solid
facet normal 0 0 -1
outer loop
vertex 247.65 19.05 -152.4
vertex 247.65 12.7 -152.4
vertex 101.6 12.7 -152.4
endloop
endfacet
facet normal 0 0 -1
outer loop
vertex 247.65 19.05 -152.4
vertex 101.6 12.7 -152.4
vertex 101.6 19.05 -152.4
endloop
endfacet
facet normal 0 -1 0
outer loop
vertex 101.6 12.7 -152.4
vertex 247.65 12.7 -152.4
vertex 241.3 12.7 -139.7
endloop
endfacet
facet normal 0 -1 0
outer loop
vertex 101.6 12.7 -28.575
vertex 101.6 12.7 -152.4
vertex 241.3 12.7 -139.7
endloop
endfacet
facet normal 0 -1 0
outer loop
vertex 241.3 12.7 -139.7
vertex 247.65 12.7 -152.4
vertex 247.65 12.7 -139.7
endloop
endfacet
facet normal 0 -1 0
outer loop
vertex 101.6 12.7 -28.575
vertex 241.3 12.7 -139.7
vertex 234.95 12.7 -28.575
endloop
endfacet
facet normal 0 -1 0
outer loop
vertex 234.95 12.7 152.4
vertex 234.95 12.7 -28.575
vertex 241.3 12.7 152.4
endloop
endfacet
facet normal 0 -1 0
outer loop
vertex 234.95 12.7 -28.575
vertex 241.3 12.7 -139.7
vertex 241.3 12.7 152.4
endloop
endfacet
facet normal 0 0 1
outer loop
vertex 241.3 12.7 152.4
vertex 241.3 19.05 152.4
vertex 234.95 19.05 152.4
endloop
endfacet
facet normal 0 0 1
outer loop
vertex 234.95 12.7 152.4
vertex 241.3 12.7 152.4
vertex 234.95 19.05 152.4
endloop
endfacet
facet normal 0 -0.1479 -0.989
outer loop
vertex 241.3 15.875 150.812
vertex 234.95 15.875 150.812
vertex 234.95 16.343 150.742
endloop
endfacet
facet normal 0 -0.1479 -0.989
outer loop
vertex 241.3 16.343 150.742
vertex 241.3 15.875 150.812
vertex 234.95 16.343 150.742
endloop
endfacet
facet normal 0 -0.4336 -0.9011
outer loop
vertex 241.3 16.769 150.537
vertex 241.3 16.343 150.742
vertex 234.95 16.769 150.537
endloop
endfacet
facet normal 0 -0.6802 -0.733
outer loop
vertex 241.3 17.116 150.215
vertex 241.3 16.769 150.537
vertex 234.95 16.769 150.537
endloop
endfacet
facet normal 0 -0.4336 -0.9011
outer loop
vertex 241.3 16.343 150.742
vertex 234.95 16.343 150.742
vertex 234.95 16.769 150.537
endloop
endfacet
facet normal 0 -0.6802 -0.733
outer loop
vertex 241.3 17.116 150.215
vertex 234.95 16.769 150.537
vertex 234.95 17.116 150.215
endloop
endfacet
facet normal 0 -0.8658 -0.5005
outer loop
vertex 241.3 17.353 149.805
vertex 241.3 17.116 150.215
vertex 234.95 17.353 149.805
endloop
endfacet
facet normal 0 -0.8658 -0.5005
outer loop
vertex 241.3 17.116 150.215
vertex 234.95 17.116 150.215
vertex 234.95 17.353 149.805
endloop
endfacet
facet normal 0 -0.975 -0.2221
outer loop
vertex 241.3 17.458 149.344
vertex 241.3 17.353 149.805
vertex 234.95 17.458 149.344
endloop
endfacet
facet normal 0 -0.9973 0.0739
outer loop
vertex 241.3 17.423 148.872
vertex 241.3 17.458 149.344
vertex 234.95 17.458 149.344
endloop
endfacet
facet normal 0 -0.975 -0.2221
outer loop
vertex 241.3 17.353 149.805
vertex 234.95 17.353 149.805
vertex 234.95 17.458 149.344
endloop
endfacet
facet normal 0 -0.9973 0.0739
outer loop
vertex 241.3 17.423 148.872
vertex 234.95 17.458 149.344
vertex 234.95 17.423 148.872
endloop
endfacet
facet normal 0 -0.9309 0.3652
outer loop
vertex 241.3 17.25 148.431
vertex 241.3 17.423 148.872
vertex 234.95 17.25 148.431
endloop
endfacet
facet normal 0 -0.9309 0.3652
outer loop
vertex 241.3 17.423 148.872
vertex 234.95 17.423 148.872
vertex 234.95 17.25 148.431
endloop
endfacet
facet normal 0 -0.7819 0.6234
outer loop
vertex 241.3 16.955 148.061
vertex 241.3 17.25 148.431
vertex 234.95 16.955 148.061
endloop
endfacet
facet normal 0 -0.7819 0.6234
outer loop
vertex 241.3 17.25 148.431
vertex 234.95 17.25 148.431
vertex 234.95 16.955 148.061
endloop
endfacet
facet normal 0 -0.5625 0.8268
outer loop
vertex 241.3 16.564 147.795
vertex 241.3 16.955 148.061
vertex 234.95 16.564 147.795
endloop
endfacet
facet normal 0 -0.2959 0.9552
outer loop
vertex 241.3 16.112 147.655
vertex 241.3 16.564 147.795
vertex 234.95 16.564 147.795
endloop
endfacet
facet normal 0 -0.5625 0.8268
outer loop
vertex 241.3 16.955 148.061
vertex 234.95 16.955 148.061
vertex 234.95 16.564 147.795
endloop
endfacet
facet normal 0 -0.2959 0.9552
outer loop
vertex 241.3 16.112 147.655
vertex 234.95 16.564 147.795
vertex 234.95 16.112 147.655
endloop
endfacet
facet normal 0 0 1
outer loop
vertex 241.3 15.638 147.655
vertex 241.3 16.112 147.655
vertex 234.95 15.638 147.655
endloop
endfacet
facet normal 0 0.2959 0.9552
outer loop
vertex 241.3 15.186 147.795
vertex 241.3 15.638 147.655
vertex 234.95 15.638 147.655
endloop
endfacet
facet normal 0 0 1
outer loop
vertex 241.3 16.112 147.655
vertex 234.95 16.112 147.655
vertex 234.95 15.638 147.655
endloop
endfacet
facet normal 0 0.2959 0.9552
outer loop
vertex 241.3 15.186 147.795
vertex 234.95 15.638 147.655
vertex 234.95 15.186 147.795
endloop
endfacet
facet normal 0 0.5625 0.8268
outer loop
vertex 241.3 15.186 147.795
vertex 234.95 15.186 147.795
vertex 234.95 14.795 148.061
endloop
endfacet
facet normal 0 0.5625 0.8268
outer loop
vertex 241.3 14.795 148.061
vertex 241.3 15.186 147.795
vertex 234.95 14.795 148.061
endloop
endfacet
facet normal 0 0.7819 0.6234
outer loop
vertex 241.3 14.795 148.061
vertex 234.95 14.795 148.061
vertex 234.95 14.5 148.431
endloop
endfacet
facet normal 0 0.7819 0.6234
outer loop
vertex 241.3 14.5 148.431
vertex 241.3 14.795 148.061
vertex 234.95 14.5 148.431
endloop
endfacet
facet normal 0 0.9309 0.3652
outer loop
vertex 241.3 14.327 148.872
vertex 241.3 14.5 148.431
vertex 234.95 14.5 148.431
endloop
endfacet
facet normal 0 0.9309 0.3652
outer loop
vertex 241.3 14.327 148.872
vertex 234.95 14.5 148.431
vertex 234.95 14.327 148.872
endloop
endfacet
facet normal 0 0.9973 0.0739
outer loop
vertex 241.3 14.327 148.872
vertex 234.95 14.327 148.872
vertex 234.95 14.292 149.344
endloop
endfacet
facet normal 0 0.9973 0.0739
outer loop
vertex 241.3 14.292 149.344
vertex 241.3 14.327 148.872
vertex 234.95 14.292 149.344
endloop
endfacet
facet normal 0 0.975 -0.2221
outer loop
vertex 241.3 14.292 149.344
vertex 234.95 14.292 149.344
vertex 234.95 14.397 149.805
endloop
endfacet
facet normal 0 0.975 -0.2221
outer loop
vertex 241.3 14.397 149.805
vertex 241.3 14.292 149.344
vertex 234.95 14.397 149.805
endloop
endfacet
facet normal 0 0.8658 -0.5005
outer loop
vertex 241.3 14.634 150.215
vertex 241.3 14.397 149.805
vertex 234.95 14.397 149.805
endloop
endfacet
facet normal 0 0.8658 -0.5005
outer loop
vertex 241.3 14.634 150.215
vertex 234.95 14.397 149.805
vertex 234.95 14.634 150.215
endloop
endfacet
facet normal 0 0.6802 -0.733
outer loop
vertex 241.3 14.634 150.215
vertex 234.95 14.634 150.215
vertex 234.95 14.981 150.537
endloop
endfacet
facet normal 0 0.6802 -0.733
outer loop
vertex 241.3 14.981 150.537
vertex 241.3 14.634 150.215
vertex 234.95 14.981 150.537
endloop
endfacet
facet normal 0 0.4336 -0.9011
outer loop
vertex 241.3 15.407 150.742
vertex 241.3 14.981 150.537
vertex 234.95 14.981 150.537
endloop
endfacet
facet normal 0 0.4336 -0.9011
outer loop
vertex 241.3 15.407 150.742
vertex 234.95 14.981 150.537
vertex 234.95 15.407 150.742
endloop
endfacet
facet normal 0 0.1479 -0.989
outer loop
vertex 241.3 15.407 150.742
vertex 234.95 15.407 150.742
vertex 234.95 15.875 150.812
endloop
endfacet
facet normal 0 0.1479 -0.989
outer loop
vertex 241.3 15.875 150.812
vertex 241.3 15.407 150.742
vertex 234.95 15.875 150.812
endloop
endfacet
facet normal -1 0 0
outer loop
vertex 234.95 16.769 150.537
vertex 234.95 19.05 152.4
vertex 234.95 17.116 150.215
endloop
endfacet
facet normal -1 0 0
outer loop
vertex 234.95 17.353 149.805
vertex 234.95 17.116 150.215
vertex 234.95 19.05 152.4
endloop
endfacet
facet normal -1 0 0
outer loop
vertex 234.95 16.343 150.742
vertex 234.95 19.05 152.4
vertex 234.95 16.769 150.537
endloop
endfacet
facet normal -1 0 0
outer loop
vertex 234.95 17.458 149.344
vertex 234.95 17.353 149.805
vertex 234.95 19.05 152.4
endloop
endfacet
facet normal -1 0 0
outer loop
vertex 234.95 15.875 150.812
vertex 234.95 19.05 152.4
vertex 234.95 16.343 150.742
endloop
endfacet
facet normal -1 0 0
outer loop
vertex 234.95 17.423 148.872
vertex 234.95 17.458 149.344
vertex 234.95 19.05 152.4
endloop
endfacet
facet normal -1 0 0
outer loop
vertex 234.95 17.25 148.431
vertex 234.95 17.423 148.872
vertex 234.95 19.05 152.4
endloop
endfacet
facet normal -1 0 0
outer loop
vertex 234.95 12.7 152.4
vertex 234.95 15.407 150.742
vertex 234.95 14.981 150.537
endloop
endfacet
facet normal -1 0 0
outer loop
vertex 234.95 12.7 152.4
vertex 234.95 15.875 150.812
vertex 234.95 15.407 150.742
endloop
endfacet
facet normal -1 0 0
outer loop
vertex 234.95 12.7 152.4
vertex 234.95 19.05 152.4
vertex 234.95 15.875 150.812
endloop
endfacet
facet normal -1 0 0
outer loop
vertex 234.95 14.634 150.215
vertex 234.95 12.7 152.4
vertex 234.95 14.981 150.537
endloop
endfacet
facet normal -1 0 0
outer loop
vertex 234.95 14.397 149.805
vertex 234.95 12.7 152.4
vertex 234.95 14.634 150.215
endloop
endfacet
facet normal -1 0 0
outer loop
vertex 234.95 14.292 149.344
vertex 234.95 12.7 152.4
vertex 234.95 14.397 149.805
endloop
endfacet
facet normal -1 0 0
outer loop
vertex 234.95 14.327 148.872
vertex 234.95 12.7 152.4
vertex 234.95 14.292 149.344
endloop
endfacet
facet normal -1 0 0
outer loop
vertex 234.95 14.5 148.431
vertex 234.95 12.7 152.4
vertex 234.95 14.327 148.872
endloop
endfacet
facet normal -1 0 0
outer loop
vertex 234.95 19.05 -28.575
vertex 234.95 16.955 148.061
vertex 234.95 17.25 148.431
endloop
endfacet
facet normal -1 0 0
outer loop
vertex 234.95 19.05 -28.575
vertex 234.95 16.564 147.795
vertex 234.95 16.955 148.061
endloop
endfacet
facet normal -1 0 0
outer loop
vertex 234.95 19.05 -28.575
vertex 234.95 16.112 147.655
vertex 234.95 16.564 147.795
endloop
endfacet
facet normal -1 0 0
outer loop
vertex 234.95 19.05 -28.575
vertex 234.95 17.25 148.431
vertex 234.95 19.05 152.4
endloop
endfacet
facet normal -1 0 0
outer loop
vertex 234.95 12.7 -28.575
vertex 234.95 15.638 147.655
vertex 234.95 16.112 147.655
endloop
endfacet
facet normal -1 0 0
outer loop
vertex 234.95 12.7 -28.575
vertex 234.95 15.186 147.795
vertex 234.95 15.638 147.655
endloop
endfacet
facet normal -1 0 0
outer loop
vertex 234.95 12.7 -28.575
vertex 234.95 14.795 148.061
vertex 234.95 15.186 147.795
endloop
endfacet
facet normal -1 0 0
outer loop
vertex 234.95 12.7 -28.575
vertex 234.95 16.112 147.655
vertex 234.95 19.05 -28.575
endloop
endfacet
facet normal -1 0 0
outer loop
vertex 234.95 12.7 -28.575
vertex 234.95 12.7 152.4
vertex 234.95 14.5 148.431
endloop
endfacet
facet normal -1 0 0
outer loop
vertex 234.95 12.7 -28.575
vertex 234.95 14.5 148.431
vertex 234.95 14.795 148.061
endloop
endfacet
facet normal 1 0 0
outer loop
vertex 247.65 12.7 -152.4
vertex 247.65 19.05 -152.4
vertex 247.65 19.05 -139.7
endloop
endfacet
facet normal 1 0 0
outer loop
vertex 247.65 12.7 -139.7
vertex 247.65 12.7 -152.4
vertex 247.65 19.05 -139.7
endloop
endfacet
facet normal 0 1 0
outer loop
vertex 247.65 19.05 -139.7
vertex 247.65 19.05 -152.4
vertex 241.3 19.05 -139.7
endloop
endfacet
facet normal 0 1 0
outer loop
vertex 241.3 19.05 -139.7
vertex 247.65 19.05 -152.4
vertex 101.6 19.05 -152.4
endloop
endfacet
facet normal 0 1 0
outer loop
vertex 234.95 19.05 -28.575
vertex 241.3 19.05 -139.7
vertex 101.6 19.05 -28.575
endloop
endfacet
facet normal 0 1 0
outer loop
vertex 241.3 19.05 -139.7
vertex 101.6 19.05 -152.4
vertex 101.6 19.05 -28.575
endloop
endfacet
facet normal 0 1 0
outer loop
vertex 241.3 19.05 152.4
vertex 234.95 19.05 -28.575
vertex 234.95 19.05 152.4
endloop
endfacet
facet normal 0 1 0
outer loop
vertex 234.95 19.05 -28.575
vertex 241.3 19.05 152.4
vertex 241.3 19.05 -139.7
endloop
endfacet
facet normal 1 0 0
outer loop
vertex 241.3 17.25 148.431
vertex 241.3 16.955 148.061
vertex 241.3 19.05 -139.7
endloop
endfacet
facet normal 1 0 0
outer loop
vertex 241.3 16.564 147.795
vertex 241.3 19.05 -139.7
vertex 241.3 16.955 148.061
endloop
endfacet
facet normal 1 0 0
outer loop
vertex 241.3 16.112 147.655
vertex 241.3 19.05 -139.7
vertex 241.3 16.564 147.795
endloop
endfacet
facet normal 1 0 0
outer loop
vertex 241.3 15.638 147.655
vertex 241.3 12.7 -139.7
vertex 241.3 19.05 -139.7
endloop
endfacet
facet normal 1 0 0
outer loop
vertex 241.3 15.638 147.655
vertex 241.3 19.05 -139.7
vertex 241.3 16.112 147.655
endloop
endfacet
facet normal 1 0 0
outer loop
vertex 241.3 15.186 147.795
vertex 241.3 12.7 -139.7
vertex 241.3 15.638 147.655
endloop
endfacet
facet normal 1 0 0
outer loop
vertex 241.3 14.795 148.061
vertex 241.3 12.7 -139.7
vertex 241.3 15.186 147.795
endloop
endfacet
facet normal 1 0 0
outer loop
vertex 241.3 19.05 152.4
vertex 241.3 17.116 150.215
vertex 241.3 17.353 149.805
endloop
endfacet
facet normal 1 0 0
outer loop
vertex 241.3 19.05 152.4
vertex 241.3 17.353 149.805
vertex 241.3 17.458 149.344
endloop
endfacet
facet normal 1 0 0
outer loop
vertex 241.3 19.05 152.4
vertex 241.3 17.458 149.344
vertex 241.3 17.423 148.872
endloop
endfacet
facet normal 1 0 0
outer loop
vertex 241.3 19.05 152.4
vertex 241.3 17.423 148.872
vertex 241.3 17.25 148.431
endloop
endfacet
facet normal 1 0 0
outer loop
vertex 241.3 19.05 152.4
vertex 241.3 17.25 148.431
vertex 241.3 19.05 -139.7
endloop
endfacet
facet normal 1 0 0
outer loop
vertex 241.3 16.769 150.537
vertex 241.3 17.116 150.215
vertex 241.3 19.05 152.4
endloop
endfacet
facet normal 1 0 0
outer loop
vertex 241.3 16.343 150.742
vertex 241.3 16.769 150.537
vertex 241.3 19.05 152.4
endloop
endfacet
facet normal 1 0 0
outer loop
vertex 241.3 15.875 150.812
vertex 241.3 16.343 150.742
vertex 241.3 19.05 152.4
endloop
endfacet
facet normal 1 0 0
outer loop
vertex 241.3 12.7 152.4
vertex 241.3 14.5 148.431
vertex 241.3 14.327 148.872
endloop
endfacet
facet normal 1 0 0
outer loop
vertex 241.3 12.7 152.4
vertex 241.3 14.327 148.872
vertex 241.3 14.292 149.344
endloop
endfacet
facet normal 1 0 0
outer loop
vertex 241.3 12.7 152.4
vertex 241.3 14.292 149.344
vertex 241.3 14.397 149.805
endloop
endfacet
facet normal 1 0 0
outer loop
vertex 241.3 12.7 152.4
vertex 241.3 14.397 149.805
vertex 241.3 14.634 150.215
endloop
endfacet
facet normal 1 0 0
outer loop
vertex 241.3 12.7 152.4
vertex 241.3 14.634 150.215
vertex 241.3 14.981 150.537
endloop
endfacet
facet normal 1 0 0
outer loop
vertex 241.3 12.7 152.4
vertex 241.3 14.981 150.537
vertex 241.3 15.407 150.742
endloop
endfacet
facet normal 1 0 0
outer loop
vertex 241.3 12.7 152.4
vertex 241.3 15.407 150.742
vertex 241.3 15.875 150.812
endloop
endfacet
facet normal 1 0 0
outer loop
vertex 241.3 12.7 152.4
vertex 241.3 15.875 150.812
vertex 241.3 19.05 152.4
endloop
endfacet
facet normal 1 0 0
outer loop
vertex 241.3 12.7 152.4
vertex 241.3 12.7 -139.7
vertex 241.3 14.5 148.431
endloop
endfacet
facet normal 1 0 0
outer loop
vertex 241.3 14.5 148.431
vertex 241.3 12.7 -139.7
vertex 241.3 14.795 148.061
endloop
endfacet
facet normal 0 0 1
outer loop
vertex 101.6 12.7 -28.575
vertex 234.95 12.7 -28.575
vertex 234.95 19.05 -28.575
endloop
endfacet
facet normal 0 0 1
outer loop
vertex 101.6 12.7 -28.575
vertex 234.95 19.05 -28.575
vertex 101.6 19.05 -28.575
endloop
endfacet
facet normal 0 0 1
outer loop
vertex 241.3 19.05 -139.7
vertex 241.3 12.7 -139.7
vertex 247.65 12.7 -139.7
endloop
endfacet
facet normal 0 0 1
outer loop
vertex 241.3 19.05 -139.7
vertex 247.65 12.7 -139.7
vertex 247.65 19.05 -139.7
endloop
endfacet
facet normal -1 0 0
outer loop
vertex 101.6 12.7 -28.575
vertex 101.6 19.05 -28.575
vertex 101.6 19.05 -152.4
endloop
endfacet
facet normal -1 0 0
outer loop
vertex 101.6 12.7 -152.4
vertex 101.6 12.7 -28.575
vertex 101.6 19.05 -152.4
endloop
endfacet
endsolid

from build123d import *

# Parameters (mm, degrees)
SKETCH1_W               = 482.6
SKETCH1_H               = 304.8
BOSS_EXTRUDE1_DEPTH     = 12.7
BOSS_EXTRUDE2_DEPTH     = 6.35
SKETCH3_R               = 1.5875
CUT_EXTRUDE1_DEPTH      = 507.449822292
SKETCH4_W               = 6.35
SKETCH4_H               = 12.7
BOSS_EXTRUDE3_DEPTH     = 292.1
SKETCH5_W               = 12.7
SKETCH5_H               = 19.05
BOSS_EXTRUDE4_DEPTH     = 6.35
CUT_EXTRUDE2_START      = 6.35
CUT_EXTRUDE2_DEPTH      = 25.4
CUT_EXTRUDE3_START      = -488.95
CUT_EXTRUDE3_DEPTH      = 25.4
BOSS_EXTRUDE5_START     = -2.54
BOSS_EXTRUDE5_DEPTH     = 7.62
CUT_EXTRUDE5_DEPTH      = 582.883177708
CUT_EXTRUDE5_DEPTH_BACK = 582.883177708
SKETCH13_W              = 304.8
SKETCH13_H              = 12.7
SKETCH17_W              = 385.398698987
SKETCH17_H              = 324.595378491
CUT_EXTRUDE8_DEPTH      = 291.854955261


with BuildPart() as part:
    # Sketch1 → Boss-Extrude1 (new body)
    with BuildSketch(Plane(origin=(0, 0, 0), x_dir=(1, 0, 0), z_dir=(0, 1, 0))):
        Rectangle(SKETCH1_W, SKETCH1_H)
    extrude(amount=BOSS_EXTRUDE1_DEPTH)

    # Sketch2 → Boss-Extrude2 (add)
    with BuildSketch(Plane(origin=(0, 12.7, 0), x_dir=(1, 0, 0), z_dir=(0, 1, 0))):
        Polygon((-241.3, 152.4), (-234.95, 152.4), (234.95, 152.4), (241.3, 152.4), (241.3, -152.4), (234.95, -152.4), (234.95, 28.575), (-234.95, 28.575), (-234.95, -152.4), (-241.3, -152.4), align=None)
    extrude(amount=BOSS_EXTRUDE2_DEPTH)

    # Sketch3 → Cut-Extrude1 (cut, through all)
    with BuildSketch(Plane.ZY.offset(241.3)):
        with Locations((149.225, 15.875)):
            Circle(SKETCH3_R)
    extrude(amount=-CUT_EXTRUDE1_DEPTH, mode=Mode.SUBTRACT)

    # Sketch4 → Boss-Extrude3 (add)
    with BuildSketch(Plane.XY.offset(152.4)):
        with Locations((-244.475, 6.35)):
            Rectangle(SKETCH4_W, SKETCH4_H)
    boss_extrude3 = extrude(amount=-BOSS_EXTRUDE3_DEPTH)

    # Sketch5 → Boss-Extrude4 (add)
    with BuildSketch(Plane.ZY.offset(241.3)):
        with Locations((-146.05, 9.525)):
            Rectangle(SKETCH5_W, SKETCH5_H)
    boss_extrude4 = extrude(amount=BOSS_EXTRUDE4_DEPTH)

    # Mirror1: Boss-Extrude3, Boss-Extrude4 across plane
    add(boss_extrude3.mirror(Plane(origin=(0, 0, 0), x_dir=(0, 0, 1), z_dir=(1, 0, 0))))
    add(boss_extrude4.mirror(Plane(origin=(0, 0, 0), x_dir=(0, 0, 1), z_dir=(1, 0, 0))))

    # Sketch6 → Cut-Extrude2 (cut)
    with BuildSketch(Plane.ZY.offset(241.3).offset(CUT_EXTRUDE2_START)):
        with BuildLine():
            Line((147.32, 2.54), (128.27, 2.54))
            ThreePointArc((128.27, 2.54), (124.46, 6.35), (128.27, 10.16))
            Line((128.27, 10.16), (147.32, 10.16))
            ThreePointArc((147.32, 10.16), (151.13, 6.35), (147.32, 2.54))
        make_face()
    extrude(amount=-CUT_EXTRUDE2_DEPTH, mode=Mode.SUBTRACT)

    # Sketch6<2> → Cut-Extrude3 (cut)
    with BuildSketch(Plane.ZY.offset(241.3).offset(CUT_EXTRUDE3_START)):
        with BuildLine():
            Line((147.32, 2.54), (128.27, 2.54))
            ThreePointArc((128.27, 2.54), (124.46, 6.35), (128.27, 10.16))
            Line((128.27, 10.16), (147.32, 10.16))
            ThreePointArc((147.32, 10.16), (151.13, 6.35), (147.32, 2.54))
        make_face()
    extrude(amount=CUT_EXTRUDE3_DEPTH, mode=Mode.SUBTRACT)

    # Sketch11 → Boss-Extrude5 (add)
    with BuildSketch(Plane.XZ.offset(BOSS_EXTRUDE5_START)):
        Polygon((-247.65, 124.46), (-222.25, 124.46), (-222.25, 140.97), align=None)
    boss_extrude5 = extrude(amount=-BOSS_EXTRUDE5_DEPTH)

    # Mirror2: Boss-Extrude5 across plane
    add(boss_extrude5.mirror(Plane(origin=(0, 0, 0), x_dir=(0, 0, 1), z_dir=(1, 0, 0))))

    # Sketch13 → Cut-Extrude5 (cut, two sides: drawn at the far end of the back side and taken through both)
    with BuildSketch(Plane(origin=(247.65, 19.05, -152.4), x_dir=(0, 0, 1), z_dir=(-1, 0, 0)).offset(-CUT_EXTRUDE5_DEPTH_BACK)):
        with Locations((152.4, -12.7)):
            Rectangle(SKETCH13_W, SKETCH13_H)
    extrude(amount=CUT_EXTRUDE5_DEPTH + CUT_EXTRUDE5_DEPTH_BACK, mode=Mode.SUBTRACT)

    # Sketch17 → Cut-Extrude8 (cut, through all)
    with BuildSketch(Plane(origin=(0, 19.05, 0), x_dir=(1, 0, 0), z_dir=(0, 1, 0))):
        with Locations((-91.099349494, -9.897689246)):
            Rectangle(SKETCH17_W, SKETCH17_H)
    extrude(amount=-CUT_EXTRUDE8_DEPTH, mode=Mode.SUBTRACT)


solid = part.part
